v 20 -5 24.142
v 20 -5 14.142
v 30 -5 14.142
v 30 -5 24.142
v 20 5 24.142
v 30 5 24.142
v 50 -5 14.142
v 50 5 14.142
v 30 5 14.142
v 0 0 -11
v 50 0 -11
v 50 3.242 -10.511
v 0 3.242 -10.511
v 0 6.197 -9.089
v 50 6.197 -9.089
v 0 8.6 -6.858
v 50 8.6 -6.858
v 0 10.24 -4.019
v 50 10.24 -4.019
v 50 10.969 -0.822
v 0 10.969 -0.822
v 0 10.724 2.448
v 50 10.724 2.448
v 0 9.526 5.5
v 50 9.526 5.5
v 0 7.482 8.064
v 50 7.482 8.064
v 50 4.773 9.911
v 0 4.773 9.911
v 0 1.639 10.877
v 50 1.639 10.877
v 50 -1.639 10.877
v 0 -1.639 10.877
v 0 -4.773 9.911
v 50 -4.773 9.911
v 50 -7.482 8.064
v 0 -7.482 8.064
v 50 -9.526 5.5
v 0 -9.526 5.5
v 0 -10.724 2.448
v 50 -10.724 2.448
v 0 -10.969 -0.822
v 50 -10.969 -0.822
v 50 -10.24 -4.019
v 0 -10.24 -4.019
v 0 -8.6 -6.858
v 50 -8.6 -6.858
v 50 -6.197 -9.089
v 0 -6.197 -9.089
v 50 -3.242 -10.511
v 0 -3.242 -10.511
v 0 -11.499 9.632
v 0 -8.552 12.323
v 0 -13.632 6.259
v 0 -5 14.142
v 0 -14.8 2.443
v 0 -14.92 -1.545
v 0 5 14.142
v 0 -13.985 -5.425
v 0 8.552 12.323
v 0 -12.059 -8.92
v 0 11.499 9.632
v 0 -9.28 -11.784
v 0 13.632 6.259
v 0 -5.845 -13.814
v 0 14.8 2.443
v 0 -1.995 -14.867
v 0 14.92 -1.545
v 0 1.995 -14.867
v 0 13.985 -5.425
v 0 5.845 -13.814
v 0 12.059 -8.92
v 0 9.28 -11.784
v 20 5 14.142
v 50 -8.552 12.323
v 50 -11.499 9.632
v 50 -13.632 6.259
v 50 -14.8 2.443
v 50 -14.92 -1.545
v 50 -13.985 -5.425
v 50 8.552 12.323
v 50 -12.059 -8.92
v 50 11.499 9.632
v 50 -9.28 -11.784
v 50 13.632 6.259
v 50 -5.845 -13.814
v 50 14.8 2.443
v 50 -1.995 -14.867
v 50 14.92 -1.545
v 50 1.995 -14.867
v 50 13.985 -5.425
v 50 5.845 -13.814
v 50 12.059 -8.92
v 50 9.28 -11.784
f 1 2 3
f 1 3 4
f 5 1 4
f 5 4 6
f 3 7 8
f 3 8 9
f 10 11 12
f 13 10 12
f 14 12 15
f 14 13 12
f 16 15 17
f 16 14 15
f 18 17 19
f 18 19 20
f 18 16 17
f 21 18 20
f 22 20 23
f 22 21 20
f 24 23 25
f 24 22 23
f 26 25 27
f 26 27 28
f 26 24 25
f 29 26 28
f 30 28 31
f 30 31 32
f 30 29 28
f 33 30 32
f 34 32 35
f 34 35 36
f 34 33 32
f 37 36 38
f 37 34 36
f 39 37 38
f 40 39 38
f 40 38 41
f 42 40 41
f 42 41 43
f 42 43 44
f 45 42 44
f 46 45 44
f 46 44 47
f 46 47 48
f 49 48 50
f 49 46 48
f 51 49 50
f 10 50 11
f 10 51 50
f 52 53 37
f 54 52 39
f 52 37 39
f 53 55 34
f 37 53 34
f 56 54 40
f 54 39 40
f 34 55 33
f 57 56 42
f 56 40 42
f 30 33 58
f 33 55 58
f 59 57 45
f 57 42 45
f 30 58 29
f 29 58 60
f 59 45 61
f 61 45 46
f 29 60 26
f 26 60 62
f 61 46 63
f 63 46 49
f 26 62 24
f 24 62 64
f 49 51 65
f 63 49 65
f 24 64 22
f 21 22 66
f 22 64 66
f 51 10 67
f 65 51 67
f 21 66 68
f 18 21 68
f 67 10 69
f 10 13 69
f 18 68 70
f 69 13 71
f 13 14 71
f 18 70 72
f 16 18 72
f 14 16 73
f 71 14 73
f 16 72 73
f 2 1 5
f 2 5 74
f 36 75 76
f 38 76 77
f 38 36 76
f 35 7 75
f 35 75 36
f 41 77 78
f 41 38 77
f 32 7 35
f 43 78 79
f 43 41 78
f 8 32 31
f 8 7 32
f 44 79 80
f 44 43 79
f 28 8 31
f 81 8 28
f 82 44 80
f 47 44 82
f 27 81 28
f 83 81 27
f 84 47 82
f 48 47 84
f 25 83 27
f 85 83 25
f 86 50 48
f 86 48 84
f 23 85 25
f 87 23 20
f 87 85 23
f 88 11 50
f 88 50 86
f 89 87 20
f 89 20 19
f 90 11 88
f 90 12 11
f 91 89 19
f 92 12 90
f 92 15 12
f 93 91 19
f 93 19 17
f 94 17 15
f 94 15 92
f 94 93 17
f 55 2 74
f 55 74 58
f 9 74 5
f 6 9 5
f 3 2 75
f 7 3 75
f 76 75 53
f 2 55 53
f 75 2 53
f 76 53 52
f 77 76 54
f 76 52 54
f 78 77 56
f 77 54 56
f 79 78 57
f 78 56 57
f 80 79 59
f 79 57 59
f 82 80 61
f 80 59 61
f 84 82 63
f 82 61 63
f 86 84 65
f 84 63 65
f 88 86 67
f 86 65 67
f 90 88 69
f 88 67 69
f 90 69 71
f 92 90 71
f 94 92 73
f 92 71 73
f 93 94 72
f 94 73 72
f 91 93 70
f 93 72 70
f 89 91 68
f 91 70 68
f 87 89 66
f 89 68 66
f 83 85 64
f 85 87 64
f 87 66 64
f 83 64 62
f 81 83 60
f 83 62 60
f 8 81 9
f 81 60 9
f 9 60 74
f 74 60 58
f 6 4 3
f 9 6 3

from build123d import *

# Parameters (mm, degrees)
SKETCH_1_R          = 15
SKETCH_1_R_2        = 11
EXTRUDE_1_DEPTH     = 50
SKETCH_2_W          = 10
SKETCH_2_H          = 10
EXTRUDE_2_DEPTH     = 50
SKETCH_3_W          = 20
SKETCH_3_H          = 10
CUT_EXTRUDE_1_DEPTH = 50


with BuildPart() as part:
    # 草图1 → 凸台-拉伸1 (new body)
    with BuildSketch(Plane(origin=(0, 0, 0), x_dir=(0, 0, -1), z_dir=(1, 0, 0))):
        Circle(SKETCH_1_R)
        Circle(SKETCH_1_R_2, mode=Mode.SUBTRACT)
    extrude(amount=EXTRUDE_1_DEPTH)

    # 草图2 → 凸台-拉伸2 (add)
    with BuildSketch(Plane.ZY):
        with Locations((19.142135624, 0)):
            Rectangle(SKETCH_2_W, SKETCH_2_H)
    extrude(amount=-EXTRUDE_2_DEPTH)

    # 草图3 → 切除-拉伸1 (cut)
    with BuildSketch(Plane(origin=(0, -5, 0), x_dir=(-1, 0, 0), z_dir=(0, -1, 0))):
        with Locations((-10, -19.142135624)):
            Rectangle(SKETCH_3_W, SKETCH_3_H)
        with Locations((-40, -19.142135624)):
            Rectangle(SKETCH_3_W, SKETCH_3_H)
    extrude(amount=-CUT_EXTRUDE_1_DEPTH, mode=Mode.SUBTRACT)


solid = part.part
